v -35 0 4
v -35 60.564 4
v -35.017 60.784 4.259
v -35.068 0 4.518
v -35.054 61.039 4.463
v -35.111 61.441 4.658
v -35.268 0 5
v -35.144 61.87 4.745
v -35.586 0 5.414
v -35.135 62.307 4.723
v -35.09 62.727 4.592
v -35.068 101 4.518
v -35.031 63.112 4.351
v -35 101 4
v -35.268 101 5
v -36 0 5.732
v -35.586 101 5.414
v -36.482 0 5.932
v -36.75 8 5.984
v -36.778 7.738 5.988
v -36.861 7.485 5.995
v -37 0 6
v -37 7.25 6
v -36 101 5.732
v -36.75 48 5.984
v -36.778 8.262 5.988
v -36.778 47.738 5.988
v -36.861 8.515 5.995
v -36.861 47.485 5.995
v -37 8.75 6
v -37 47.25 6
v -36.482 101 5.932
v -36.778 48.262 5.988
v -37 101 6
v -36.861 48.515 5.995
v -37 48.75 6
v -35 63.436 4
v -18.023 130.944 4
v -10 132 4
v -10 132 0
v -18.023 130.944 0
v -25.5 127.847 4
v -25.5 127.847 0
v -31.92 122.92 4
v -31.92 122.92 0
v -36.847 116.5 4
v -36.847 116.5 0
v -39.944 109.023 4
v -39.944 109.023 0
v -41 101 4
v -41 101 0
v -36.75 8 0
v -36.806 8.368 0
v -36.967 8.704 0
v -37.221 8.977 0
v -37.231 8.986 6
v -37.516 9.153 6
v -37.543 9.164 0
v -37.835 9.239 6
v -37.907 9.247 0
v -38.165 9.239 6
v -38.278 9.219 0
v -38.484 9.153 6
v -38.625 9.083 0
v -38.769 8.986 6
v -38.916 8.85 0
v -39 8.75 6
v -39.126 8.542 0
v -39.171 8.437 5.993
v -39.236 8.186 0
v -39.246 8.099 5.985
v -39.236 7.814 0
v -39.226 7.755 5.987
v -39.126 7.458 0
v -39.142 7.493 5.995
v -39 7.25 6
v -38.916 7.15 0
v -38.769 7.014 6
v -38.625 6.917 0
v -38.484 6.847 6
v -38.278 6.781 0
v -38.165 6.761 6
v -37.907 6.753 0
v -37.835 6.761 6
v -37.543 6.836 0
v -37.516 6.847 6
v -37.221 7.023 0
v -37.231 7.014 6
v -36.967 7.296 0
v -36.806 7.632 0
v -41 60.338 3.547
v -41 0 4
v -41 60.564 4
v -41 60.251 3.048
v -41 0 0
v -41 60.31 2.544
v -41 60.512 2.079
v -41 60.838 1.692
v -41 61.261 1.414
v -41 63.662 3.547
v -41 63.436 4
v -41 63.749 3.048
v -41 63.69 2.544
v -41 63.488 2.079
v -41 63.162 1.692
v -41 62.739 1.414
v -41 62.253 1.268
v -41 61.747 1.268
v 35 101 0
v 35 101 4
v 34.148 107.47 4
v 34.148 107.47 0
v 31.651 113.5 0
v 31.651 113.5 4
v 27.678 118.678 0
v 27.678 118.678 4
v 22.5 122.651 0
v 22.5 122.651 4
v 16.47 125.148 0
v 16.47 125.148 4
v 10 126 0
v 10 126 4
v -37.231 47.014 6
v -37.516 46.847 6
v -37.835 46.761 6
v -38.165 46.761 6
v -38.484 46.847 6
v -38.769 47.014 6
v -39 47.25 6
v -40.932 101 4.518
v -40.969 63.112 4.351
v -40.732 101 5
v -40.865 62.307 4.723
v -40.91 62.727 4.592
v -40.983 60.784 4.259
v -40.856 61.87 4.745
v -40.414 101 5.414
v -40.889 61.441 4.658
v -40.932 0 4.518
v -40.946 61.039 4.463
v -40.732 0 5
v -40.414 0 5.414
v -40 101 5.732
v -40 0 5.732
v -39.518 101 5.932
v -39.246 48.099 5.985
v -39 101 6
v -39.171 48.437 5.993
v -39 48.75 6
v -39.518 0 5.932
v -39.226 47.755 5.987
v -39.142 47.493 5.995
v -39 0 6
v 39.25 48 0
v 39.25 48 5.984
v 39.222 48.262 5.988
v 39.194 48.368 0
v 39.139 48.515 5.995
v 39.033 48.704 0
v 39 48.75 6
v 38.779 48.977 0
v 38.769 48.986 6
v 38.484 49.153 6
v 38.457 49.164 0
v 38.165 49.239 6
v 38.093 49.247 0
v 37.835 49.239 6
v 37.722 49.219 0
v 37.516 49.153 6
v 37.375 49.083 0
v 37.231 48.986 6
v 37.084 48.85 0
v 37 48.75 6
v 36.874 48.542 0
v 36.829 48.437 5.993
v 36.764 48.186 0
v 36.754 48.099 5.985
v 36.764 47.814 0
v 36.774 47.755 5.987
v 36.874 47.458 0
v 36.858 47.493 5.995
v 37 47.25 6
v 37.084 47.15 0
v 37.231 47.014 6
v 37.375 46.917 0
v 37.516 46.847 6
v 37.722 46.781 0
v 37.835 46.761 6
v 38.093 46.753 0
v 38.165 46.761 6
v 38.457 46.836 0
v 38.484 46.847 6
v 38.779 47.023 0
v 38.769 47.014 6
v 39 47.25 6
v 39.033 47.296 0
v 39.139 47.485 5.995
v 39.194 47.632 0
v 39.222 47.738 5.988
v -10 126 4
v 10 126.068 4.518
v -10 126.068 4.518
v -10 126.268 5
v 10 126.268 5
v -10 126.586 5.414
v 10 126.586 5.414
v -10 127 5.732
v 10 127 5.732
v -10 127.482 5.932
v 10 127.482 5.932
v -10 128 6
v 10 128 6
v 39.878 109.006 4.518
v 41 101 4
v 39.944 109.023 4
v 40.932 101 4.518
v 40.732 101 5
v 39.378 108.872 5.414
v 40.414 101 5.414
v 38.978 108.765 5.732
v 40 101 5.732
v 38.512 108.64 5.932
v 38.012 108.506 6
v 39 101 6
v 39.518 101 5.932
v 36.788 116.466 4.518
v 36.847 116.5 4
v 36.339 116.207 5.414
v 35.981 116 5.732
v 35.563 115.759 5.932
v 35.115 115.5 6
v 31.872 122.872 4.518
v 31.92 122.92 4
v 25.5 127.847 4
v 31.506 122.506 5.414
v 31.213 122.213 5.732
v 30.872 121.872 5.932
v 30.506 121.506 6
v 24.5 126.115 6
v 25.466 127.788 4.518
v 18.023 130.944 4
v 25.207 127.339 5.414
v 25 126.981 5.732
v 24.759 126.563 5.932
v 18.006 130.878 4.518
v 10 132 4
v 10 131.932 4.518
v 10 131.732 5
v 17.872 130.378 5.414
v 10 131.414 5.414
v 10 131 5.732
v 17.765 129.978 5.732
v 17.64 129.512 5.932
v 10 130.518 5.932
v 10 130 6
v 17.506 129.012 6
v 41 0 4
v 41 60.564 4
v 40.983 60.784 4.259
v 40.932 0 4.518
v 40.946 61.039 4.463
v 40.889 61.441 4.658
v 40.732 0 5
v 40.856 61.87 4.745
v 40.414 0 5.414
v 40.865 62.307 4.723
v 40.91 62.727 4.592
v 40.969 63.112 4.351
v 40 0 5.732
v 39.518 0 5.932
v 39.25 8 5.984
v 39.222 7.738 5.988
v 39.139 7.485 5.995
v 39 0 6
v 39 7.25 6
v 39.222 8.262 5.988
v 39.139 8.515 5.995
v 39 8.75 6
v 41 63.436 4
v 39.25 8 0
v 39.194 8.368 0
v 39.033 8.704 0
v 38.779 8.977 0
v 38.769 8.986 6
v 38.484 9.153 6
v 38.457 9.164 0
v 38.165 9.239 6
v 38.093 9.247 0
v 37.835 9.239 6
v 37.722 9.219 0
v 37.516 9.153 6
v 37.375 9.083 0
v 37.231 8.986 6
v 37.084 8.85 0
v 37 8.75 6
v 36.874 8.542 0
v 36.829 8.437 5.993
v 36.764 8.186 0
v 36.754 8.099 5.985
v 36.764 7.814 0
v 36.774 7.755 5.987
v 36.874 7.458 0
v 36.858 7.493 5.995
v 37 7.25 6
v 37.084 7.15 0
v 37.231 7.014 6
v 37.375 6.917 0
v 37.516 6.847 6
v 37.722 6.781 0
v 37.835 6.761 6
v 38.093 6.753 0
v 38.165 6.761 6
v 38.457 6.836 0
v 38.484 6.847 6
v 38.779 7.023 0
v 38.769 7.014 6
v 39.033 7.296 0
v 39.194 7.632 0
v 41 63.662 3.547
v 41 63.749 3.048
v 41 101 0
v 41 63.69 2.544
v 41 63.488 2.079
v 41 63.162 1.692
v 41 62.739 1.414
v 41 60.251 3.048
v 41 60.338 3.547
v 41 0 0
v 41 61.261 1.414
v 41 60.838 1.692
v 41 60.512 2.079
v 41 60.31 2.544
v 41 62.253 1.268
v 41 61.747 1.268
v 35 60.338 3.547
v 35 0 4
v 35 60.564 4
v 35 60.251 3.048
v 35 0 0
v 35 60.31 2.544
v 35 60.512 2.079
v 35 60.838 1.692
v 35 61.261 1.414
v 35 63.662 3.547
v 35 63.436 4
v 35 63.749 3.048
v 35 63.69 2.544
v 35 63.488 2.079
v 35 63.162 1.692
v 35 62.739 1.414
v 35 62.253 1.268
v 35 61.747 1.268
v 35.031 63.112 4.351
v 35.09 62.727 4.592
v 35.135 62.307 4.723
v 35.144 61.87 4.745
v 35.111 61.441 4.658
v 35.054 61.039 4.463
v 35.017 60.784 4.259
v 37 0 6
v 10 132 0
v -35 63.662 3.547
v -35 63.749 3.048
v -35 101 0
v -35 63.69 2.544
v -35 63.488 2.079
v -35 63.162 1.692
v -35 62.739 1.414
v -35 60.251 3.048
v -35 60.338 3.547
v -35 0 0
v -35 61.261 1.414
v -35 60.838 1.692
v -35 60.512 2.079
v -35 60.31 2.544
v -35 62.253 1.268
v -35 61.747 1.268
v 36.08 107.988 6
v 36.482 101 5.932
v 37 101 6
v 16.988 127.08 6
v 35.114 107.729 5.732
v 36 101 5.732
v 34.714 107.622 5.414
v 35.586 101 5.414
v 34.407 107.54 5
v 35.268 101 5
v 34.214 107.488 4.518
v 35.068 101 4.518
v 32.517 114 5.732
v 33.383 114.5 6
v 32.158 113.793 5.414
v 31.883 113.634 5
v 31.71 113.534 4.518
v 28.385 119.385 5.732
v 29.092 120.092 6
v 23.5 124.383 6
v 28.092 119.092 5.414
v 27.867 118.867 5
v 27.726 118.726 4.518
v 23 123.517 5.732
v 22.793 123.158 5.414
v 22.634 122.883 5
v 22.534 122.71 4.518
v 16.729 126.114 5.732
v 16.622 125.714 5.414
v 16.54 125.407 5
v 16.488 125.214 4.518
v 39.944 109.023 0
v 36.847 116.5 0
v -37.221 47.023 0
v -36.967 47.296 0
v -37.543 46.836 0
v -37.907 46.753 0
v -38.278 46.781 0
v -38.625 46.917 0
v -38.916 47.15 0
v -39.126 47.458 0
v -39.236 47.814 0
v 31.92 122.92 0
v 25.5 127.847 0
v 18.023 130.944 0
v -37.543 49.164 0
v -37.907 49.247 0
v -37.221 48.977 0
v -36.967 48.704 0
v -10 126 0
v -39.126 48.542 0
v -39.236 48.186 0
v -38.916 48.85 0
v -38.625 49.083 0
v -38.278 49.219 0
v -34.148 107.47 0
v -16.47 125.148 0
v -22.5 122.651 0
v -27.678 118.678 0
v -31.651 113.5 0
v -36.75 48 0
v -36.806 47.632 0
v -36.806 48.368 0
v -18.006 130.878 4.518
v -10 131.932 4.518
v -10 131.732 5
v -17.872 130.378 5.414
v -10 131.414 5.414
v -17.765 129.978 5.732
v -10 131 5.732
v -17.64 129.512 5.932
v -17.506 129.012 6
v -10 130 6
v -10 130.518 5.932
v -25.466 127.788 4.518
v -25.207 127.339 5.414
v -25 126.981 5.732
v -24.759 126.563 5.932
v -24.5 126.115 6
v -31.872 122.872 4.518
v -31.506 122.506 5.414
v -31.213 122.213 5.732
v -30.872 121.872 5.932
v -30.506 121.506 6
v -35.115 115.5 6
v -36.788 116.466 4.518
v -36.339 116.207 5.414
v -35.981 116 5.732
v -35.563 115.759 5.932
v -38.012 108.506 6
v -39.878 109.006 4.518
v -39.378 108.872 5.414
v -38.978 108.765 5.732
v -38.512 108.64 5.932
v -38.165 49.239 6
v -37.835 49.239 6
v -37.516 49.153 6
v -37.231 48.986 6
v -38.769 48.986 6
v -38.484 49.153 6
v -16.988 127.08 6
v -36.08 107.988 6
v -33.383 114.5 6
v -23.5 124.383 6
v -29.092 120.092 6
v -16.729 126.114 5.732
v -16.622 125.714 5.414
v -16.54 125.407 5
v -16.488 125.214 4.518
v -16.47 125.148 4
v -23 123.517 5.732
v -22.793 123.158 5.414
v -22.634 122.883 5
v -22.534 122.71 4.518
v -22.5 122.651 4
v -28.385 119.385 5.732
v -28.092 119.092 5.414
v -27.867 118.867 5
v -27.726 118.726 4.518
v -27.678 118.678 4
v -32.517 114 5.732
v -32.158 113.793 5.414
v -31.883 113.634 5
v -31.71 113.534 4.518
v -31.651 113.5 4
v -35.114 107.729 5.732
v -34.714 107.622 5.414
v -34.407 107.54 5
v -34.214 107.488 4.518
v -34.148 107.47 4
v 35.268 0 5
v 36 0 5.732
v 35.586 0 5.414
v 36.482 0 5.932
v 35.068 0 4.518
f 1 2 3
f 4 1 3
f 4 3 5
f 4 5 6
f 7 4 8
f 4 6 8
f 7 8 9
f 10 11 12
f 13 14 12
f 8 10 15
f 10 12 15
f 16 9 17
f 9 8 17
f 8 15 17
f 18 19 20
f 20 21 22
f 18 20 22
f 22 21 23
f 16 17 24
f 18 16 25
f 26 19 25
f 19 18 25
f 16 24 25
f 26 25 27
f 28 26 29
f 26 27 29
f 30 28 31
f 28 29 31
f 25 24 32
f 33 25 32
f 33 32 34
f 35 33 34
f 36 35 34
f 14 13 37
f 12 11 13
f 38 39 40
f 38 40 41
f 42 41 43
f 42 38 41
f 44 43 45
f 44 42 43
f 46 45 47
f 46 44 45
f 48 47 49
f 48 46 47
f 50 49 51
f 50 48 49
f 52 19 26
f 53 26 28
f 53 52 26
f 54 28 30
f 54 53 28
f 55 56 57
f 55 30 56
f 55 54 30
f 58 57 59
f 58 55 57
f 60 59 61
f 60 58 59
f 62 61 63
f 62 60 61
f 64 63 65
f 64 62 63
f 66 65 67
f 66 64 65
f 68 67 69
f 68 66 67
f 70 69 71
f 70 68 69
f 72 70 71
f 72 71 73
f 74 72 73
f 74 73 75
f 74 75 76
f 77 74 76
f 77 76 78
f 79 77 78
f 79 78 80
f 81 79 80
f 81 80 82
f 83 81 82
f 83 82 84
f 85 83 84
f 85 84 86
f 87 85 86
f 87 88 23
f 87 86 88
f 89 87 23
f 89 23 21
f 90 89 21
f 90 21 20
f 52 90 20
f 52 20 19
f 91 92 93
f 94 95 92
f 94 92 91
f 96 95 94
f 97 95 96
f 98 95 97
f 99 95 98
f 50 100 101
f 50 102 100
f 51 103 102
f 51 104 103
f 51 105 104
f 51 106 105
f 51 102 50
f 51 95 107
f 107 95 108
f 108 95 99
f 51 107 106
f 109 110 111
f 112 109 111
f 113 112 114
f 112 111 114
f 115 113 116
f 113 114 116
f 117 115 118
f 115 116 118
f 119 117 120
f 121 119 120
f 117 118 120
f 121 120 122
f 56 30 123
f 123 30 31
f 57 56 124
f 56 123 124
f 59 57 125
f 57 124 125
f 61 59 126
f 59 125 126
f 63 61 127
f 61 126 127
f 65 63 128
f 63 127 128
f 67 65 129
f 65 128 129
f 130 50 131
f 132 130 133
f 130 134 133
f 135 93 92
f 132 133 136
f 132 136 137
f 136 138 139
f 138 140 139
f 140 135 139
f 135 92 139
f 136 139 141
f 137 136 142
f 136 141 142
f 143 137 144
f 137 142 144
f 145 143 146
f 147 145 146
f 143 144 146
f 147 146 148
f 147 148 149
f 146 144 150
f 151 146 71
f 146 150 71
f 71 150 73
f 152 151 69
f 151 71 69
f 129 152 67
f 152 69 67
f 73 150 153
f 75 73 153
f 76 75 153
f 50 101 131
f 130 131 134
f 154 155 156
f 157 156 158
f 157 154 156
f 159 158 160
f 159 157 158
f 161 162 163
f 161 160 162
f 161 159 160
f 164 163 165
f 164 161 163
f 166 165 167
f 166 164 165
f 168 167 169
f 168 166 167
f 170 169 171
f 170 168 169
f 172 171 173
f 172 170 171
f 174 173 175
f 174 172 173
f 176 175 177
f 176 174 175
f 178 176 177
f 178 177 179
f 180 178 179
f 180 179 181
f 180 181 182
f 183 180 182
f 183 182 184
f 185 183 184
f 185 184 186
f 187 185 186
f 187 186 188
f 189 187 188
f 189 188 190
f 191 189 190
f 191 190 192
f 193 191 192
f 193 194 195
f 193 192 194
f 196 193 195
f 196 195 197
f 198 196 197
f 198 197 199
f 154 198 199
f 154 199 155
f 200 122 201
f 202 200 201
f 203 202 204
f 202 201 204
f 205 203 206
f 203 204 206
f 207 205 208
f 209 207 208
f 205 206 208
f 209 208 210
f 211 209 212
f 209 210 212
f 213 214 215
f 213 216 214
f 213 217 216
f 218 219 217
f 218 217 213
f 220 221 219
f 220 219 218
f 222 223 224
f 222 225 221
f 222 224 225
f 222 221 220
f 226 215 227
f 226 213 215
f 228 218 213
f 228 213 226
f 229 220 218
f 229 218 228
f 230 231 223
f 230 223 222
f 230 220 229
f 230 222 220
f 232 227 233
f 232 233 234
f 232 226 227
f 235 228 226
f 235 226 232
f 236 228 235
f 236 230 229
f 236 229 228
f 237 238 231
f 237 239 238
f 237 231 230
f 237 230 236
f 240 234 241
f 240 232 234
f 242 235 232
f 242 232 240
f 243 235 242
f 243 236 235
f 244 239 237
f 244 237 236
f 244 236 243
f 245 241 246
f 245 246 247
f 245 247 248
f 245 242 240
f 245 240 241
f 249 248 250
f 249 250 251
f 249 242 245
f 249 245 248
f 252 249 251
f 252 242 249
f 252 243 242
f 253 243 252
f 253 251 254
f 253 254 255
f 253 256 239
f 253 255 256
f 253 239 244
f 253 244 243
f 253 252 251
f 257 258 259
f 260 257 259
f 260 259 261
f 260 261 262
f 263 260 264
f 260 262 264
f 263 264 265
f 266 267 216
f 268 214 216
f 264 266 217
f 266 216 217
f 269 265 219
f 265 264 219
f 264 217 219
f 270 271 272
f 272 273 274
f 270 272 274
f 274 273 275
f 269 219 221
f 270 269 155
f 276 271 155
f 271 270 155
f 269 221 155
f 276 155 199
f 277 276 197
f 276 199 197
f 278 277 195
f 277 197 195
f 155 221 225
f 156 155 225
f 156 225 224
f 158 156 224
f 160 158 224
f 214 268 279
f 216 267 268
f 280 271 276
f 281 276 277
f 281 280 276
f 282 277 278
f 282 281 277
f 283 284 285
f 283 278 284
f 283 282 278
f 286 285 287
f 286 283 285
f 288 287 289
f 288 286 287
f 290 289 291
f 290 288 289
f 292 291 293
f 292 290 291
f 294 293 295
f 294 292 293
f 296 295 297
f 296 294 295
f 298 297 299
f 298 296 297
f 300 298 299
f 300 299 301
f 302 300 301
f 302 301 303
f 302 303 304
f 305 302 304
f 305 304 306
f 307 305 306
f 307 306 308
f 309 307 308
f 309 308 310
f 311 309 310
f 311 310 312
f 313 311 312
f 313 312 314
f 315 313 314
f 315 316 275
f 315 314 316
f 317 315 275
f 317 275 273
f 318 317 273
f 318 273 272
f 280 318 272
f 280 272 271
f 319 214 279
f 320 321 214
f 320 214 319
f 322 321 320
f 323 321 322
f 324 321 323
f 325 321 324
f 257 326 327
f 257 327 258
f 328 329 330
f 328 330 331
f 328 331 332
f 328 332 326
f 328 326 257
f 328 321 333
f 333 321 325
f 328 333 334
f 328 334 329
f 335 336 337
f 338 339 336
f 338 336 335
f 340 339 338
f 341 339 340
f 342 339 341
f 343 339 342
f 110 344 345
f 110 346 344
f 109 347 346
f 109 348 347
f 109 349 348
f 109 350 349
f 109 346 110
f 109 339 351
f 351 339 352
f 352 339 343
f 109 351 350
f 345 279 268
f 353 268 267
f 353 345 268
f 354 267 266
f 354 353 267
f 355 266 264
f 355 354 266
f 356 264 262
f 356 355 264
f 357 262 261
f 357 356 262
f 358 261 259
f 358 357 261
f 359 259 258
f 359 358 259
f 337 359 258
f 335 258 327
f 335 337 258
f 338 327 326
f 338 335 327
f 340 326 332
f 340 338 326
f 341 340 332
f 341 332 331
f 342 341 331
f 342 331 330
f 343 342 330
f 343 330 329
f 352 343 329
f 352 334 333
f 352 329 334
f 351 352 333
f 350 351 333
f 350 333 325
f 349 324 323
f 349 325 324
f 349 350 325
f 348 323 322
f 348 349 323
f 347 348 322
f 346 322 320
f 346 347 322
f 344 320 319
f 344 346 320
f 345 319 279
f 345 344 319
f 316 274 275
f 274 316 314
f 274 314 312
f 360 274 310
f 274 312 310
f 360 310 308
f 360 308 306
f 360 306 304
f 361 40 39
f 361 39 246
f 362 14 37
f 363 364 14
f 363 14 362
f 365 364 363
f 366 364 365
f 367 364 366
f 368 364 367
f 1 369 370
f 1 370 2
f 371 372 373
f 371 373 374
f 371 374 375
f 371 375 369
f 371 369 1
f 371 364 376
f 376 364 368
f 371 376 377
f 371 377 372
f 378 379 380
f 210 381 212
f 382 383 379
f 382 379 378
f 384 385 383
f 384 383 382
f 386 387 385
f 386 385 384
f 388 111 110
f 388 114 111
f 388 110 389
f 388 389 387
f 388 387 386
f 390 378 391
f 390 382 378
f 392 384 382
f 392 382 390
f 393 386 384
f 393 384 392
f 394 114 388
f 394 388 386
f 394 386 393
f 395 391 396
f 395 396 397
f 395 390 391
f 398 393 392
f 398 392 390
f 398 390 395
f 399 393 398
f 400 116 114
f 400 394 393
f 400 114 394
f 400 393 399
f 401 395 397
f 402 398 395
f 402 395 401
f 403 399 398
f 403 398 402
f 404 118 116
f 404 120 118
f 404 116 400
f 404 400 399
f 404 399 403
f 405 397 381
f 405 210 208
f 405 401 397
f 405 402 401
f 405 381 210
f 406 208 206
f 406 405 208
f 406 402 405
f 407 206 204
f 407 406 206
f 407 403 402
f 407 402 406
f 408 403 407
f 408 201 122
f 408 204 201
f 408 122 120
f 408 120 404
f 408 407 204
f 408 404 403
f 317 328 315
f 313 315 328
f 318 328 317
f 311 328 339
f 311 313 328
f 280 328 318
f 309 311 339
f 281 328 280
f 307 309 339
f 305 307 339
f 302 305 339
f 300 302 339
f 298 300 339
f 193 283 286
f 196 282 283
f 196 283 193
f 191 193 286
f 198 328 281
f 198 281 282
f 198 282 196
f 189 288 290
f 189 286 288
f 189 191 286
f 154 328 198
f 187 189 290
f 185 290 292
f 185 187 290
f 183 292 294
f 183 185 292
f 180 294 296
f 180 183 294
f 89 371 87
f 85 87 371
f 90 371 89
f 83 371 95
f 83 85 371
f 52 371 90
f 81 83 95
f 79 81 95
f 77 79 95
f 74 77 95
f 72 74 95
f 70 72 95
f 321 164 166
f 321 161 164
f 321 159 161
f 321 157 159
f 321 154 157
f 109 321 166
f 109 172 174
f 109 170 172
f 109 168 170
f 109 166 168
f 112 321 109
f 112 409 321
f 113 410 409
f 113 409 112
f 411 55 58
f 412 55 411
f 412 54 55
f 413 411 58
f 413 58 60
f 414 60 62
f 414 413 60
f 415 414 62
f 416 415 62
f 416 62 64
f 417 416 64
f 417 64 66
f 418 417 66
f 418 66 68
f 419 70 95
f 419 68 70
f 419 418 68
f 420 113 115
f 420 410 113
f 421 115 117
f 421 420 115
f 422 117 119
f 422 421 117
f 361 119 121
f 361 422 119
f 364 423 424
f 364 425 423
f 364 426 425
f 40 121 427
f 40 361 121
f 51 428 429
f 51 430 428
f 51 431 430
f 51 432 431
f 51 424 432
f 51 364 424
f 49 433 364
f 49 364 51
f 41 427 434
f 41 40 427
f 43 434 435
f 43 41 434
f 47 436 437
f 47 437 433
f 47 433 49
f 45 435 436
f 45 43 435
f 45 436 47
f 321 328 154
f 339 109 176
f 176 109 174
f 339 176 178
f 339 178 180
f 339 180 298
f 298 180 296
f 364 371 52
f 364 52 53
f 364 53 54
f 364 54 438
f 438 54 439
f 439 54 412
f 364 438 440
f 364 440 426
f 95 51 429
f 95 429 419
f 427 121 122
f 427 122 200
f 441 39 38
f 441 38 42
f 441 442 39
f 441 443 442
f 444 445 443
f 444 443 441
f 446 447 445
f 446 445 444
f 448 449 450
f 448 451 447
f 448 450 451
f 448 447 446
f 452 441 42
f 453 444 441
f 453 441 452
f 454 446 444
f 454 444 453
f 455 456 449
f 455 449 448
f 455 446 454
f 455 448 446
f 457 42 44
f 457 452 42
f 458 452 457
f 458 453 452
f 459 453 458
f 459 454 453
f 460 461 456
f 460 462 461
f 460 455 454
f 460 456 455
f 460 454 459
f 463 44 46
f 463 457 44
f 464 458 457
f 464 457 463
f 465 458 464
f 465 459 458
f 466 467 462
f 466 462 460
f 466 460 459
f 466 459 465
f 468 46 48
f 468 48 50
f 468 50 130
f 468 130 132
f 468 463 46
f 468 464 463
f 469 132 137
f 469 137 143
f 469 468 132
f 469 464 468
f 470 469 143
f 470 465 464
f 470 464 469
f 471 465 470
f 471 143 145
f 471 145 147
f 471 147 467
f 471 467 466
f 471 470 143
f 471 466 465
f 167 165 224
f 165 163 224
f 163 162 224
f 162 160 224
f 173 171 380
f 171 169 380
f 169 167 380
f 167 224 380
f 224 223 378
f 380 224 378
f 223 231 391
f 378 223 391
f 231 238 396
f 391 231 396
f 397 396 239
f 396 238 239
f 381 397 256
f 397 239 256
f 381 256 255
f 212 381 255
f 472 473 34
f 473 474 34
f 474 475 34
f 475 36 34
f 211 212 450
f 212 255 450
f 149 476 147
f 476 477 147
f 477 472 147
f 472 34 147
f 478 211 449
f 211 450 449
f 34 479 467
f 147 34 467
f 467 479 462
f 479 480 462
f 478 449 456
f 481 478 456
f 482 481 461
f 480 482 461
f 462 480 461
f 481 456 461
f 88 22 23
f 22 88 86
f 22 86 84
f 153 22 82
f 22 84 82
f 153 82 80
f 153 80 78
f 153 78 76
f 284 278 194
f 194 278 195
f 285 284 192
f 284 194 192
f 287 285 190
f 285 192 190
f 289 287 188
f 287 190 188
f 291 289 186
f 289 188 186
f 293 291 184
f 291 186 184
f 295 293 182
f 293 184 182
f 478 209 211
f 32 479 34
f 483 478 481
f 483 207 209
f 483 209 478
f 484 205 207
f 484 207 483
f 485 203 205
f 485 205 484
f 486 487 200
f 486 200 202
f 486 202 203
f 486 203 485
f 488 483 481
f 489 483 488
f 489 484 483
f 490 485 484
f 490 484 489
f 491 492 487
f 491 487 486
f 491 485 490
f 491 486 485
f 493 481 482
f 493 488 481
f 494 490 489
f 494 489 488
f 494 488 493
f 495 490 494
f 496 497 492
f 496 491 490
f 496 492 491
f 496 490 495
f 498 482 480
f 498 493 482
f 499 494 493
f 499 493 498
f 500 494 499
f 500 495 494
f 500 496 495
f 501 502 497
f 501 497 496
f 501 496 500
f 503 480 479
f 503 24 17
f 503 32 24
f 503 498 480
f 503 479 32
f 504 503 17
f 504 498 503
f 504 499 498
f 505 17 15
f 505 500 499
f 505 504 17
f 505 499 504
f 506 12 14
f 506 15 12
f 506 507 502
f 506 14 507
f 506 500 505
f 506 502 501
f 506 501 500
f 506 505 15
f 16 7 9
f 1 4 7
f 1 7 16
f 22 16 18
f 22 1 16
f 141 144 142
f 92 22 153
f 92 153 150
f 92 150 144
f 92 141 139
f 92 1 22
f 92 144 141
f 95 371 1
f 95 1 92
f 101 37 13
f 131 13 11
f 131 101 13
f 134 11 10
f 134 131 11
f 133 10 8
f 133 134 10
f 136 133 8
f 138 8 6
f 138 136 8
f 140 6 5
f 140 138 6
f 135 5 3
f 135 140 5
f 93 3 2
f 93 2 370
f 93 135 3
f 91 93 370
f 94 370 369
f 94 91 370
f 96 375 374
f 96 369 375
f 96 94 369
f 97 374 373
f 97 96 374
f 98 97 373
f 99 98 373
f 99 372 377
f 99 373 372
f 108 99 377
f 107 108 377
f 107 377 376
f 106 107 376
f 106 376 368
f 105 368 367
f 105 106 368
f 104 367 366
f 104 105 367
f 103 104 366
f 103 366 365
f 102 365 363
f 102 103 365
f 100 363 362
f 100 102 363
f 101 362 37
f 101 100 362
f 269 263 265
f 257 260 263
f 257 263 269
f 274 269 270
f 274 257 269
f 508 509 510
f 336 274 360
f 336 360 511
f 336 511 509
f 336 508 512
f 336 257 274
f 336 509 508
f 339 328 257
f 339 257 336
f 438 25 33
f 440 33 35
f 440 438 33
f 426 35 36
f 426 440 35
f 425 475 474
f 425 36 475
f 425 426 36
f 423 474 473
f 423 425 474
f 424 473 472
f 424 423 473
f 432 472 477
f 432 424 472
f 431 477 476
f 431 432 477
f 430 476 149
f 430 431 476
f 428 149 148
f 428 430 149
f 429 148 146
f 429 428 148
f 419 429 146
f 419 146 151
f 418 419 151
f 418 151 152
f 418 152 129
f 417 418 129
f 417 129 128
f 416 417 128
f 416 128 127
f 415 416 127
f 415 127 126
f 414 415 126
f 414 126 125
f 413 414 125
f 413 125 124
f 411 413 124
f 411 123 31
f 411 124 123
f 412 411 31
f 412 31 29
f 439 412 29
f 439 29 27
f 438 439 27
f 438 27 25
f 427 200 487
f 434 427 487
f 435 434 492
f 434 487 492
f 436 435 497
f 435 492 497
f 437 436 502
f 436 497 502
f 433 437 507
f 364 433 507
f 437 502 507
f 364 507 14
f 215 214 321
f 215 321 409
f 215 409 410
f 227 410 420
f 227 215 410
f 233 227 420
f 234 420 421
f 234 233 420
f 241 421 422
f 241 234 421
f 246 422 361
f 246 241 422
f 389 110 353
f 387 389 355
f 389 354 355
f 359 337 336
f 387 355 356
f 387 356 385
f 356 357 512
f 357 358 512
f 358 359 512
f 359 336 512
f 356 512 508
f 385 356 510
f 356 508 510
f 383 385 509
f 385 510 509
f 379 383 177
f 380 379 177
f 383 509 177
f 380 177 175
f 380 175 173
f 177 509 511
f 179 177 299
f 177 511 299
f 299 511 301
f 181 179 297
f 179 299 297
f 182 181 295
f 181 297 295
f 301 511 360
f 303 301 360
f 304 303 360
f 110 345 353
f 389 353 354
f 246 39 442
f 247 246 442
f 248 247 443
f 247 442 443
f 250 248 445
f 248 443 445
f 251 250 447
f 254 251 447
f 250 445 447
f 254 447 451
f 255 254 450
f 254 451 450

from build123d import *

# Parameters (mm, degrees)
BOSS_EXTRU_1_DEPTH           = 6
ENL_V_MAT_EXTRU_1_DEPTH      = 139.351002888
ENL_V_MAT_EXTRU_1_DEPTH_BACK = 139.351002888
ESQUISSE2_R                  = 1.25
CONG_1_R                     = 25
CONG_2_R                     = 31
CONG_3_R                     = 2
ENL_V_MAT_EXTRU_2_DEPTH      = 156.512057552
ENL_V_MAT_EXTRU_2_DEPTH_BACK = 156.512057552
ESQUISSE3_R                  = 1.75


with BuildPart() as part:
    # Esquisse1 → Boss.-Extru.1 (new body)
    with BuildSketch(Plane.XY):
        Polygon((35, 0), (35, 126), (-35, 126), (-35, 0), (-41, 0), (-41, 132), (41, 132), (41, 0), align=None)
    extrude(amount=BOSS_EXTRU_1_DEPTH)

    # Esquisse2 → Enlèv. mat.-Extru.1 (cut, two sides: drawn at the far end of the back side and taken through both)
    with BuildSketch(Plane.XY.offset(6).offset(-ENL_V_MAT_EXTRU_1_DEPTH_BACK)):
        with Locations((-38, 48)):
            Circle(ESQUISSE2_R)
        with Locations((-38, 8)):
            Circle(ESQUISSE2_R)
        with Locations((38, 8)):
            Circle(ESQUISSE2_R)
        with Locations((38, 48)):
            Circle(ESQUISSE2_R)
    extrude(amount=ENL_V_MAT_EXTRU_1_DEPTH + ENL_V_MAT_EXTRU_1_DEPTH_BACK, mode=Mode.SUBTRACT)

    # Congé1
    cong_1_edges = [part.edges().sort_by_distance(p)[0] for p in [
        (35, 126, 3),
        (-35, 126, 3),
    ]]
    fillet(cong_1_edges, radius=CONG_1_R)

    # Congé2
    cong_2_edges = [part.edges().sort_by_distance(p)[0] for p in [
        (-41, 132, 3),
        (41, 132, 3),
    ]]
    fillet(cong_2_edges, radius=CONG_2_R)

    # Congé3
    # the kernel refuses this fillet: 2 mm, written as the material it takes off along each edge
    with BuildSketch(Plane(origin=(-35, 101, 6), x_dir=(0, 0, -1), z_dir=(0, -1, 0)), Plane(origin=(35, -5, 6), x_dir=(0, 0, -1), z_dir=(0, 1, 0)), Plane(origin=(-41, -5, 6), x_dir=(0, 0, -1), z_dir=(0, 1, 0)), Plane(origin=(41, 101, 6), x_dir=(0, 0, -1), z_dir=(0, -1, 0))) as cong_3_piece_1:
        with BuildLine():
            CenterArc((CONG_3_R, -CONG_3_R), CONG_3_R, 90, 90)
            Line((0, -CONG_3_R), (0, 0))
            Line((0, 0), (CONG_3_R, 0))
        make_face()
    extrude(amount=106, mode=Mode.SUBTRACT)
    with BuildSketch(Plane(origin=(10, 126, 6), x_dir=(0, 0, -1), z_dir=(-1, 0, 0)), Plane(origin=(-10, 132, 6), x_dir=(0, 0, -1), z_dir=(1, 0, 0))) as cong_3_piece_2:
        with BuildLine():
            CenterArc((CONG_3_R, -CONG_3_R), CONG_3_R, 90, 90)
            Line((0, -CONG_3_R), (0, 0))
            Line((0, 0), (CONG_3_R, 0))
        make_face()
    extrude(amount=20, mode=Mode.SUBTRACT)
    with BuildSketch(Plane(origin=(10, 101, 6), x_dir=(1, 0, 0), z_dir=(0, -1, 0))) as cong_3_piece_3:
        with BuildLine():
            CenterArc((25 + CONG_3_R, -CONG_3_R), CONG_3_R, 90, 90)
            Line((25 + CONG_3_R, 0), (25, 0))
            Line((25, 0), (25, -CONG_3_R))
        make_face()
    revolve(axis=Axis((10, 101, 6), (0, 0, 1)), revolution_arc=90, mode=Mode.SUBTRACT)
    with BuildSketch(Plane(origin=(-10, 101, 6), x_dir=(0, 1, 0), z_dir=(1, 0, 0))) as cong_3_piece_4:
        with BuildLine():
            CenterArc((25 + CONG_3_R, -CONG_3_R), CONG_3_R, 90, 90)
            Line((25 + CONG_3_R, 0), (25, 0))
            Line((25, 0), (25, -CONG_3_R))
        make_face()
    revolve(axis=Axis((-10, 101, 6), (0, 0, 1)), revolution_arc=90, mode=Mode.SUBTRACT)
    with BuildSketch(Plane(origin=(-10, 101, 6), x_dir=(0, 1, 0), z_dir=(1, 0, 0))) as cong_3_piece_5:
        with BuildLine():
            CenterArc((31 - CONG_3_R, -CONG_3_R), CONG_3_R, 0, 90)
            Line((31 - CONG_3_R, 0), (31, 0))
            Line((31, 0), (31, -CONG_3_R))
        make_face()
    revolve(axis=Axis((-10, 101, 6), (0, 0, 1)), revolution_arc=90, mode=Mode.SUBTRACT)
    with BuildSketch(Plane(origin=(10, 101, 6), x_dir=(1, 0, 0), z_dir=(0, -1, 0))) as cong_3_piece_6:
        with BuildLine():
            CenterArc((31 - CONG_3_R, -CONG_3_R), CONG_3_R, 0, 90)
            Line((31 - CONG_3_R, 0), (31, 0))
            Line((31, 0), (31, -CONG_3_R))
        make_face()
    revolve(axis=Axis((10, 101, 6), (0, 0, 1)), revolution_arc=90, mode=Mode.SUBTRACT)

    # Esquisse3 → Enlèv. mat.-Extru.2 (cut, two sides: drawn at the far end of the back side and taken through both)
    with BuildSketch(Plane(origin=(41, 0, 0), x_dir=(0, 0, -1), z_dir=(1, 0, 0)).offset(-ENL_V_MAT_EXTRU_2_DEPTH_BACK)):
        with Locations(Location((-3, 62, 0), (0, 0, 124.849904579))):
            Circle(ESQUISSE3_R)
    extrude(amount=ENL_V_MAT_EXTRU_2_DEPTH + ENL_V_MAT_EXTRU_2_DEPTH_BACK, mode=Mode.SUBTRACT)


solid = part.part
